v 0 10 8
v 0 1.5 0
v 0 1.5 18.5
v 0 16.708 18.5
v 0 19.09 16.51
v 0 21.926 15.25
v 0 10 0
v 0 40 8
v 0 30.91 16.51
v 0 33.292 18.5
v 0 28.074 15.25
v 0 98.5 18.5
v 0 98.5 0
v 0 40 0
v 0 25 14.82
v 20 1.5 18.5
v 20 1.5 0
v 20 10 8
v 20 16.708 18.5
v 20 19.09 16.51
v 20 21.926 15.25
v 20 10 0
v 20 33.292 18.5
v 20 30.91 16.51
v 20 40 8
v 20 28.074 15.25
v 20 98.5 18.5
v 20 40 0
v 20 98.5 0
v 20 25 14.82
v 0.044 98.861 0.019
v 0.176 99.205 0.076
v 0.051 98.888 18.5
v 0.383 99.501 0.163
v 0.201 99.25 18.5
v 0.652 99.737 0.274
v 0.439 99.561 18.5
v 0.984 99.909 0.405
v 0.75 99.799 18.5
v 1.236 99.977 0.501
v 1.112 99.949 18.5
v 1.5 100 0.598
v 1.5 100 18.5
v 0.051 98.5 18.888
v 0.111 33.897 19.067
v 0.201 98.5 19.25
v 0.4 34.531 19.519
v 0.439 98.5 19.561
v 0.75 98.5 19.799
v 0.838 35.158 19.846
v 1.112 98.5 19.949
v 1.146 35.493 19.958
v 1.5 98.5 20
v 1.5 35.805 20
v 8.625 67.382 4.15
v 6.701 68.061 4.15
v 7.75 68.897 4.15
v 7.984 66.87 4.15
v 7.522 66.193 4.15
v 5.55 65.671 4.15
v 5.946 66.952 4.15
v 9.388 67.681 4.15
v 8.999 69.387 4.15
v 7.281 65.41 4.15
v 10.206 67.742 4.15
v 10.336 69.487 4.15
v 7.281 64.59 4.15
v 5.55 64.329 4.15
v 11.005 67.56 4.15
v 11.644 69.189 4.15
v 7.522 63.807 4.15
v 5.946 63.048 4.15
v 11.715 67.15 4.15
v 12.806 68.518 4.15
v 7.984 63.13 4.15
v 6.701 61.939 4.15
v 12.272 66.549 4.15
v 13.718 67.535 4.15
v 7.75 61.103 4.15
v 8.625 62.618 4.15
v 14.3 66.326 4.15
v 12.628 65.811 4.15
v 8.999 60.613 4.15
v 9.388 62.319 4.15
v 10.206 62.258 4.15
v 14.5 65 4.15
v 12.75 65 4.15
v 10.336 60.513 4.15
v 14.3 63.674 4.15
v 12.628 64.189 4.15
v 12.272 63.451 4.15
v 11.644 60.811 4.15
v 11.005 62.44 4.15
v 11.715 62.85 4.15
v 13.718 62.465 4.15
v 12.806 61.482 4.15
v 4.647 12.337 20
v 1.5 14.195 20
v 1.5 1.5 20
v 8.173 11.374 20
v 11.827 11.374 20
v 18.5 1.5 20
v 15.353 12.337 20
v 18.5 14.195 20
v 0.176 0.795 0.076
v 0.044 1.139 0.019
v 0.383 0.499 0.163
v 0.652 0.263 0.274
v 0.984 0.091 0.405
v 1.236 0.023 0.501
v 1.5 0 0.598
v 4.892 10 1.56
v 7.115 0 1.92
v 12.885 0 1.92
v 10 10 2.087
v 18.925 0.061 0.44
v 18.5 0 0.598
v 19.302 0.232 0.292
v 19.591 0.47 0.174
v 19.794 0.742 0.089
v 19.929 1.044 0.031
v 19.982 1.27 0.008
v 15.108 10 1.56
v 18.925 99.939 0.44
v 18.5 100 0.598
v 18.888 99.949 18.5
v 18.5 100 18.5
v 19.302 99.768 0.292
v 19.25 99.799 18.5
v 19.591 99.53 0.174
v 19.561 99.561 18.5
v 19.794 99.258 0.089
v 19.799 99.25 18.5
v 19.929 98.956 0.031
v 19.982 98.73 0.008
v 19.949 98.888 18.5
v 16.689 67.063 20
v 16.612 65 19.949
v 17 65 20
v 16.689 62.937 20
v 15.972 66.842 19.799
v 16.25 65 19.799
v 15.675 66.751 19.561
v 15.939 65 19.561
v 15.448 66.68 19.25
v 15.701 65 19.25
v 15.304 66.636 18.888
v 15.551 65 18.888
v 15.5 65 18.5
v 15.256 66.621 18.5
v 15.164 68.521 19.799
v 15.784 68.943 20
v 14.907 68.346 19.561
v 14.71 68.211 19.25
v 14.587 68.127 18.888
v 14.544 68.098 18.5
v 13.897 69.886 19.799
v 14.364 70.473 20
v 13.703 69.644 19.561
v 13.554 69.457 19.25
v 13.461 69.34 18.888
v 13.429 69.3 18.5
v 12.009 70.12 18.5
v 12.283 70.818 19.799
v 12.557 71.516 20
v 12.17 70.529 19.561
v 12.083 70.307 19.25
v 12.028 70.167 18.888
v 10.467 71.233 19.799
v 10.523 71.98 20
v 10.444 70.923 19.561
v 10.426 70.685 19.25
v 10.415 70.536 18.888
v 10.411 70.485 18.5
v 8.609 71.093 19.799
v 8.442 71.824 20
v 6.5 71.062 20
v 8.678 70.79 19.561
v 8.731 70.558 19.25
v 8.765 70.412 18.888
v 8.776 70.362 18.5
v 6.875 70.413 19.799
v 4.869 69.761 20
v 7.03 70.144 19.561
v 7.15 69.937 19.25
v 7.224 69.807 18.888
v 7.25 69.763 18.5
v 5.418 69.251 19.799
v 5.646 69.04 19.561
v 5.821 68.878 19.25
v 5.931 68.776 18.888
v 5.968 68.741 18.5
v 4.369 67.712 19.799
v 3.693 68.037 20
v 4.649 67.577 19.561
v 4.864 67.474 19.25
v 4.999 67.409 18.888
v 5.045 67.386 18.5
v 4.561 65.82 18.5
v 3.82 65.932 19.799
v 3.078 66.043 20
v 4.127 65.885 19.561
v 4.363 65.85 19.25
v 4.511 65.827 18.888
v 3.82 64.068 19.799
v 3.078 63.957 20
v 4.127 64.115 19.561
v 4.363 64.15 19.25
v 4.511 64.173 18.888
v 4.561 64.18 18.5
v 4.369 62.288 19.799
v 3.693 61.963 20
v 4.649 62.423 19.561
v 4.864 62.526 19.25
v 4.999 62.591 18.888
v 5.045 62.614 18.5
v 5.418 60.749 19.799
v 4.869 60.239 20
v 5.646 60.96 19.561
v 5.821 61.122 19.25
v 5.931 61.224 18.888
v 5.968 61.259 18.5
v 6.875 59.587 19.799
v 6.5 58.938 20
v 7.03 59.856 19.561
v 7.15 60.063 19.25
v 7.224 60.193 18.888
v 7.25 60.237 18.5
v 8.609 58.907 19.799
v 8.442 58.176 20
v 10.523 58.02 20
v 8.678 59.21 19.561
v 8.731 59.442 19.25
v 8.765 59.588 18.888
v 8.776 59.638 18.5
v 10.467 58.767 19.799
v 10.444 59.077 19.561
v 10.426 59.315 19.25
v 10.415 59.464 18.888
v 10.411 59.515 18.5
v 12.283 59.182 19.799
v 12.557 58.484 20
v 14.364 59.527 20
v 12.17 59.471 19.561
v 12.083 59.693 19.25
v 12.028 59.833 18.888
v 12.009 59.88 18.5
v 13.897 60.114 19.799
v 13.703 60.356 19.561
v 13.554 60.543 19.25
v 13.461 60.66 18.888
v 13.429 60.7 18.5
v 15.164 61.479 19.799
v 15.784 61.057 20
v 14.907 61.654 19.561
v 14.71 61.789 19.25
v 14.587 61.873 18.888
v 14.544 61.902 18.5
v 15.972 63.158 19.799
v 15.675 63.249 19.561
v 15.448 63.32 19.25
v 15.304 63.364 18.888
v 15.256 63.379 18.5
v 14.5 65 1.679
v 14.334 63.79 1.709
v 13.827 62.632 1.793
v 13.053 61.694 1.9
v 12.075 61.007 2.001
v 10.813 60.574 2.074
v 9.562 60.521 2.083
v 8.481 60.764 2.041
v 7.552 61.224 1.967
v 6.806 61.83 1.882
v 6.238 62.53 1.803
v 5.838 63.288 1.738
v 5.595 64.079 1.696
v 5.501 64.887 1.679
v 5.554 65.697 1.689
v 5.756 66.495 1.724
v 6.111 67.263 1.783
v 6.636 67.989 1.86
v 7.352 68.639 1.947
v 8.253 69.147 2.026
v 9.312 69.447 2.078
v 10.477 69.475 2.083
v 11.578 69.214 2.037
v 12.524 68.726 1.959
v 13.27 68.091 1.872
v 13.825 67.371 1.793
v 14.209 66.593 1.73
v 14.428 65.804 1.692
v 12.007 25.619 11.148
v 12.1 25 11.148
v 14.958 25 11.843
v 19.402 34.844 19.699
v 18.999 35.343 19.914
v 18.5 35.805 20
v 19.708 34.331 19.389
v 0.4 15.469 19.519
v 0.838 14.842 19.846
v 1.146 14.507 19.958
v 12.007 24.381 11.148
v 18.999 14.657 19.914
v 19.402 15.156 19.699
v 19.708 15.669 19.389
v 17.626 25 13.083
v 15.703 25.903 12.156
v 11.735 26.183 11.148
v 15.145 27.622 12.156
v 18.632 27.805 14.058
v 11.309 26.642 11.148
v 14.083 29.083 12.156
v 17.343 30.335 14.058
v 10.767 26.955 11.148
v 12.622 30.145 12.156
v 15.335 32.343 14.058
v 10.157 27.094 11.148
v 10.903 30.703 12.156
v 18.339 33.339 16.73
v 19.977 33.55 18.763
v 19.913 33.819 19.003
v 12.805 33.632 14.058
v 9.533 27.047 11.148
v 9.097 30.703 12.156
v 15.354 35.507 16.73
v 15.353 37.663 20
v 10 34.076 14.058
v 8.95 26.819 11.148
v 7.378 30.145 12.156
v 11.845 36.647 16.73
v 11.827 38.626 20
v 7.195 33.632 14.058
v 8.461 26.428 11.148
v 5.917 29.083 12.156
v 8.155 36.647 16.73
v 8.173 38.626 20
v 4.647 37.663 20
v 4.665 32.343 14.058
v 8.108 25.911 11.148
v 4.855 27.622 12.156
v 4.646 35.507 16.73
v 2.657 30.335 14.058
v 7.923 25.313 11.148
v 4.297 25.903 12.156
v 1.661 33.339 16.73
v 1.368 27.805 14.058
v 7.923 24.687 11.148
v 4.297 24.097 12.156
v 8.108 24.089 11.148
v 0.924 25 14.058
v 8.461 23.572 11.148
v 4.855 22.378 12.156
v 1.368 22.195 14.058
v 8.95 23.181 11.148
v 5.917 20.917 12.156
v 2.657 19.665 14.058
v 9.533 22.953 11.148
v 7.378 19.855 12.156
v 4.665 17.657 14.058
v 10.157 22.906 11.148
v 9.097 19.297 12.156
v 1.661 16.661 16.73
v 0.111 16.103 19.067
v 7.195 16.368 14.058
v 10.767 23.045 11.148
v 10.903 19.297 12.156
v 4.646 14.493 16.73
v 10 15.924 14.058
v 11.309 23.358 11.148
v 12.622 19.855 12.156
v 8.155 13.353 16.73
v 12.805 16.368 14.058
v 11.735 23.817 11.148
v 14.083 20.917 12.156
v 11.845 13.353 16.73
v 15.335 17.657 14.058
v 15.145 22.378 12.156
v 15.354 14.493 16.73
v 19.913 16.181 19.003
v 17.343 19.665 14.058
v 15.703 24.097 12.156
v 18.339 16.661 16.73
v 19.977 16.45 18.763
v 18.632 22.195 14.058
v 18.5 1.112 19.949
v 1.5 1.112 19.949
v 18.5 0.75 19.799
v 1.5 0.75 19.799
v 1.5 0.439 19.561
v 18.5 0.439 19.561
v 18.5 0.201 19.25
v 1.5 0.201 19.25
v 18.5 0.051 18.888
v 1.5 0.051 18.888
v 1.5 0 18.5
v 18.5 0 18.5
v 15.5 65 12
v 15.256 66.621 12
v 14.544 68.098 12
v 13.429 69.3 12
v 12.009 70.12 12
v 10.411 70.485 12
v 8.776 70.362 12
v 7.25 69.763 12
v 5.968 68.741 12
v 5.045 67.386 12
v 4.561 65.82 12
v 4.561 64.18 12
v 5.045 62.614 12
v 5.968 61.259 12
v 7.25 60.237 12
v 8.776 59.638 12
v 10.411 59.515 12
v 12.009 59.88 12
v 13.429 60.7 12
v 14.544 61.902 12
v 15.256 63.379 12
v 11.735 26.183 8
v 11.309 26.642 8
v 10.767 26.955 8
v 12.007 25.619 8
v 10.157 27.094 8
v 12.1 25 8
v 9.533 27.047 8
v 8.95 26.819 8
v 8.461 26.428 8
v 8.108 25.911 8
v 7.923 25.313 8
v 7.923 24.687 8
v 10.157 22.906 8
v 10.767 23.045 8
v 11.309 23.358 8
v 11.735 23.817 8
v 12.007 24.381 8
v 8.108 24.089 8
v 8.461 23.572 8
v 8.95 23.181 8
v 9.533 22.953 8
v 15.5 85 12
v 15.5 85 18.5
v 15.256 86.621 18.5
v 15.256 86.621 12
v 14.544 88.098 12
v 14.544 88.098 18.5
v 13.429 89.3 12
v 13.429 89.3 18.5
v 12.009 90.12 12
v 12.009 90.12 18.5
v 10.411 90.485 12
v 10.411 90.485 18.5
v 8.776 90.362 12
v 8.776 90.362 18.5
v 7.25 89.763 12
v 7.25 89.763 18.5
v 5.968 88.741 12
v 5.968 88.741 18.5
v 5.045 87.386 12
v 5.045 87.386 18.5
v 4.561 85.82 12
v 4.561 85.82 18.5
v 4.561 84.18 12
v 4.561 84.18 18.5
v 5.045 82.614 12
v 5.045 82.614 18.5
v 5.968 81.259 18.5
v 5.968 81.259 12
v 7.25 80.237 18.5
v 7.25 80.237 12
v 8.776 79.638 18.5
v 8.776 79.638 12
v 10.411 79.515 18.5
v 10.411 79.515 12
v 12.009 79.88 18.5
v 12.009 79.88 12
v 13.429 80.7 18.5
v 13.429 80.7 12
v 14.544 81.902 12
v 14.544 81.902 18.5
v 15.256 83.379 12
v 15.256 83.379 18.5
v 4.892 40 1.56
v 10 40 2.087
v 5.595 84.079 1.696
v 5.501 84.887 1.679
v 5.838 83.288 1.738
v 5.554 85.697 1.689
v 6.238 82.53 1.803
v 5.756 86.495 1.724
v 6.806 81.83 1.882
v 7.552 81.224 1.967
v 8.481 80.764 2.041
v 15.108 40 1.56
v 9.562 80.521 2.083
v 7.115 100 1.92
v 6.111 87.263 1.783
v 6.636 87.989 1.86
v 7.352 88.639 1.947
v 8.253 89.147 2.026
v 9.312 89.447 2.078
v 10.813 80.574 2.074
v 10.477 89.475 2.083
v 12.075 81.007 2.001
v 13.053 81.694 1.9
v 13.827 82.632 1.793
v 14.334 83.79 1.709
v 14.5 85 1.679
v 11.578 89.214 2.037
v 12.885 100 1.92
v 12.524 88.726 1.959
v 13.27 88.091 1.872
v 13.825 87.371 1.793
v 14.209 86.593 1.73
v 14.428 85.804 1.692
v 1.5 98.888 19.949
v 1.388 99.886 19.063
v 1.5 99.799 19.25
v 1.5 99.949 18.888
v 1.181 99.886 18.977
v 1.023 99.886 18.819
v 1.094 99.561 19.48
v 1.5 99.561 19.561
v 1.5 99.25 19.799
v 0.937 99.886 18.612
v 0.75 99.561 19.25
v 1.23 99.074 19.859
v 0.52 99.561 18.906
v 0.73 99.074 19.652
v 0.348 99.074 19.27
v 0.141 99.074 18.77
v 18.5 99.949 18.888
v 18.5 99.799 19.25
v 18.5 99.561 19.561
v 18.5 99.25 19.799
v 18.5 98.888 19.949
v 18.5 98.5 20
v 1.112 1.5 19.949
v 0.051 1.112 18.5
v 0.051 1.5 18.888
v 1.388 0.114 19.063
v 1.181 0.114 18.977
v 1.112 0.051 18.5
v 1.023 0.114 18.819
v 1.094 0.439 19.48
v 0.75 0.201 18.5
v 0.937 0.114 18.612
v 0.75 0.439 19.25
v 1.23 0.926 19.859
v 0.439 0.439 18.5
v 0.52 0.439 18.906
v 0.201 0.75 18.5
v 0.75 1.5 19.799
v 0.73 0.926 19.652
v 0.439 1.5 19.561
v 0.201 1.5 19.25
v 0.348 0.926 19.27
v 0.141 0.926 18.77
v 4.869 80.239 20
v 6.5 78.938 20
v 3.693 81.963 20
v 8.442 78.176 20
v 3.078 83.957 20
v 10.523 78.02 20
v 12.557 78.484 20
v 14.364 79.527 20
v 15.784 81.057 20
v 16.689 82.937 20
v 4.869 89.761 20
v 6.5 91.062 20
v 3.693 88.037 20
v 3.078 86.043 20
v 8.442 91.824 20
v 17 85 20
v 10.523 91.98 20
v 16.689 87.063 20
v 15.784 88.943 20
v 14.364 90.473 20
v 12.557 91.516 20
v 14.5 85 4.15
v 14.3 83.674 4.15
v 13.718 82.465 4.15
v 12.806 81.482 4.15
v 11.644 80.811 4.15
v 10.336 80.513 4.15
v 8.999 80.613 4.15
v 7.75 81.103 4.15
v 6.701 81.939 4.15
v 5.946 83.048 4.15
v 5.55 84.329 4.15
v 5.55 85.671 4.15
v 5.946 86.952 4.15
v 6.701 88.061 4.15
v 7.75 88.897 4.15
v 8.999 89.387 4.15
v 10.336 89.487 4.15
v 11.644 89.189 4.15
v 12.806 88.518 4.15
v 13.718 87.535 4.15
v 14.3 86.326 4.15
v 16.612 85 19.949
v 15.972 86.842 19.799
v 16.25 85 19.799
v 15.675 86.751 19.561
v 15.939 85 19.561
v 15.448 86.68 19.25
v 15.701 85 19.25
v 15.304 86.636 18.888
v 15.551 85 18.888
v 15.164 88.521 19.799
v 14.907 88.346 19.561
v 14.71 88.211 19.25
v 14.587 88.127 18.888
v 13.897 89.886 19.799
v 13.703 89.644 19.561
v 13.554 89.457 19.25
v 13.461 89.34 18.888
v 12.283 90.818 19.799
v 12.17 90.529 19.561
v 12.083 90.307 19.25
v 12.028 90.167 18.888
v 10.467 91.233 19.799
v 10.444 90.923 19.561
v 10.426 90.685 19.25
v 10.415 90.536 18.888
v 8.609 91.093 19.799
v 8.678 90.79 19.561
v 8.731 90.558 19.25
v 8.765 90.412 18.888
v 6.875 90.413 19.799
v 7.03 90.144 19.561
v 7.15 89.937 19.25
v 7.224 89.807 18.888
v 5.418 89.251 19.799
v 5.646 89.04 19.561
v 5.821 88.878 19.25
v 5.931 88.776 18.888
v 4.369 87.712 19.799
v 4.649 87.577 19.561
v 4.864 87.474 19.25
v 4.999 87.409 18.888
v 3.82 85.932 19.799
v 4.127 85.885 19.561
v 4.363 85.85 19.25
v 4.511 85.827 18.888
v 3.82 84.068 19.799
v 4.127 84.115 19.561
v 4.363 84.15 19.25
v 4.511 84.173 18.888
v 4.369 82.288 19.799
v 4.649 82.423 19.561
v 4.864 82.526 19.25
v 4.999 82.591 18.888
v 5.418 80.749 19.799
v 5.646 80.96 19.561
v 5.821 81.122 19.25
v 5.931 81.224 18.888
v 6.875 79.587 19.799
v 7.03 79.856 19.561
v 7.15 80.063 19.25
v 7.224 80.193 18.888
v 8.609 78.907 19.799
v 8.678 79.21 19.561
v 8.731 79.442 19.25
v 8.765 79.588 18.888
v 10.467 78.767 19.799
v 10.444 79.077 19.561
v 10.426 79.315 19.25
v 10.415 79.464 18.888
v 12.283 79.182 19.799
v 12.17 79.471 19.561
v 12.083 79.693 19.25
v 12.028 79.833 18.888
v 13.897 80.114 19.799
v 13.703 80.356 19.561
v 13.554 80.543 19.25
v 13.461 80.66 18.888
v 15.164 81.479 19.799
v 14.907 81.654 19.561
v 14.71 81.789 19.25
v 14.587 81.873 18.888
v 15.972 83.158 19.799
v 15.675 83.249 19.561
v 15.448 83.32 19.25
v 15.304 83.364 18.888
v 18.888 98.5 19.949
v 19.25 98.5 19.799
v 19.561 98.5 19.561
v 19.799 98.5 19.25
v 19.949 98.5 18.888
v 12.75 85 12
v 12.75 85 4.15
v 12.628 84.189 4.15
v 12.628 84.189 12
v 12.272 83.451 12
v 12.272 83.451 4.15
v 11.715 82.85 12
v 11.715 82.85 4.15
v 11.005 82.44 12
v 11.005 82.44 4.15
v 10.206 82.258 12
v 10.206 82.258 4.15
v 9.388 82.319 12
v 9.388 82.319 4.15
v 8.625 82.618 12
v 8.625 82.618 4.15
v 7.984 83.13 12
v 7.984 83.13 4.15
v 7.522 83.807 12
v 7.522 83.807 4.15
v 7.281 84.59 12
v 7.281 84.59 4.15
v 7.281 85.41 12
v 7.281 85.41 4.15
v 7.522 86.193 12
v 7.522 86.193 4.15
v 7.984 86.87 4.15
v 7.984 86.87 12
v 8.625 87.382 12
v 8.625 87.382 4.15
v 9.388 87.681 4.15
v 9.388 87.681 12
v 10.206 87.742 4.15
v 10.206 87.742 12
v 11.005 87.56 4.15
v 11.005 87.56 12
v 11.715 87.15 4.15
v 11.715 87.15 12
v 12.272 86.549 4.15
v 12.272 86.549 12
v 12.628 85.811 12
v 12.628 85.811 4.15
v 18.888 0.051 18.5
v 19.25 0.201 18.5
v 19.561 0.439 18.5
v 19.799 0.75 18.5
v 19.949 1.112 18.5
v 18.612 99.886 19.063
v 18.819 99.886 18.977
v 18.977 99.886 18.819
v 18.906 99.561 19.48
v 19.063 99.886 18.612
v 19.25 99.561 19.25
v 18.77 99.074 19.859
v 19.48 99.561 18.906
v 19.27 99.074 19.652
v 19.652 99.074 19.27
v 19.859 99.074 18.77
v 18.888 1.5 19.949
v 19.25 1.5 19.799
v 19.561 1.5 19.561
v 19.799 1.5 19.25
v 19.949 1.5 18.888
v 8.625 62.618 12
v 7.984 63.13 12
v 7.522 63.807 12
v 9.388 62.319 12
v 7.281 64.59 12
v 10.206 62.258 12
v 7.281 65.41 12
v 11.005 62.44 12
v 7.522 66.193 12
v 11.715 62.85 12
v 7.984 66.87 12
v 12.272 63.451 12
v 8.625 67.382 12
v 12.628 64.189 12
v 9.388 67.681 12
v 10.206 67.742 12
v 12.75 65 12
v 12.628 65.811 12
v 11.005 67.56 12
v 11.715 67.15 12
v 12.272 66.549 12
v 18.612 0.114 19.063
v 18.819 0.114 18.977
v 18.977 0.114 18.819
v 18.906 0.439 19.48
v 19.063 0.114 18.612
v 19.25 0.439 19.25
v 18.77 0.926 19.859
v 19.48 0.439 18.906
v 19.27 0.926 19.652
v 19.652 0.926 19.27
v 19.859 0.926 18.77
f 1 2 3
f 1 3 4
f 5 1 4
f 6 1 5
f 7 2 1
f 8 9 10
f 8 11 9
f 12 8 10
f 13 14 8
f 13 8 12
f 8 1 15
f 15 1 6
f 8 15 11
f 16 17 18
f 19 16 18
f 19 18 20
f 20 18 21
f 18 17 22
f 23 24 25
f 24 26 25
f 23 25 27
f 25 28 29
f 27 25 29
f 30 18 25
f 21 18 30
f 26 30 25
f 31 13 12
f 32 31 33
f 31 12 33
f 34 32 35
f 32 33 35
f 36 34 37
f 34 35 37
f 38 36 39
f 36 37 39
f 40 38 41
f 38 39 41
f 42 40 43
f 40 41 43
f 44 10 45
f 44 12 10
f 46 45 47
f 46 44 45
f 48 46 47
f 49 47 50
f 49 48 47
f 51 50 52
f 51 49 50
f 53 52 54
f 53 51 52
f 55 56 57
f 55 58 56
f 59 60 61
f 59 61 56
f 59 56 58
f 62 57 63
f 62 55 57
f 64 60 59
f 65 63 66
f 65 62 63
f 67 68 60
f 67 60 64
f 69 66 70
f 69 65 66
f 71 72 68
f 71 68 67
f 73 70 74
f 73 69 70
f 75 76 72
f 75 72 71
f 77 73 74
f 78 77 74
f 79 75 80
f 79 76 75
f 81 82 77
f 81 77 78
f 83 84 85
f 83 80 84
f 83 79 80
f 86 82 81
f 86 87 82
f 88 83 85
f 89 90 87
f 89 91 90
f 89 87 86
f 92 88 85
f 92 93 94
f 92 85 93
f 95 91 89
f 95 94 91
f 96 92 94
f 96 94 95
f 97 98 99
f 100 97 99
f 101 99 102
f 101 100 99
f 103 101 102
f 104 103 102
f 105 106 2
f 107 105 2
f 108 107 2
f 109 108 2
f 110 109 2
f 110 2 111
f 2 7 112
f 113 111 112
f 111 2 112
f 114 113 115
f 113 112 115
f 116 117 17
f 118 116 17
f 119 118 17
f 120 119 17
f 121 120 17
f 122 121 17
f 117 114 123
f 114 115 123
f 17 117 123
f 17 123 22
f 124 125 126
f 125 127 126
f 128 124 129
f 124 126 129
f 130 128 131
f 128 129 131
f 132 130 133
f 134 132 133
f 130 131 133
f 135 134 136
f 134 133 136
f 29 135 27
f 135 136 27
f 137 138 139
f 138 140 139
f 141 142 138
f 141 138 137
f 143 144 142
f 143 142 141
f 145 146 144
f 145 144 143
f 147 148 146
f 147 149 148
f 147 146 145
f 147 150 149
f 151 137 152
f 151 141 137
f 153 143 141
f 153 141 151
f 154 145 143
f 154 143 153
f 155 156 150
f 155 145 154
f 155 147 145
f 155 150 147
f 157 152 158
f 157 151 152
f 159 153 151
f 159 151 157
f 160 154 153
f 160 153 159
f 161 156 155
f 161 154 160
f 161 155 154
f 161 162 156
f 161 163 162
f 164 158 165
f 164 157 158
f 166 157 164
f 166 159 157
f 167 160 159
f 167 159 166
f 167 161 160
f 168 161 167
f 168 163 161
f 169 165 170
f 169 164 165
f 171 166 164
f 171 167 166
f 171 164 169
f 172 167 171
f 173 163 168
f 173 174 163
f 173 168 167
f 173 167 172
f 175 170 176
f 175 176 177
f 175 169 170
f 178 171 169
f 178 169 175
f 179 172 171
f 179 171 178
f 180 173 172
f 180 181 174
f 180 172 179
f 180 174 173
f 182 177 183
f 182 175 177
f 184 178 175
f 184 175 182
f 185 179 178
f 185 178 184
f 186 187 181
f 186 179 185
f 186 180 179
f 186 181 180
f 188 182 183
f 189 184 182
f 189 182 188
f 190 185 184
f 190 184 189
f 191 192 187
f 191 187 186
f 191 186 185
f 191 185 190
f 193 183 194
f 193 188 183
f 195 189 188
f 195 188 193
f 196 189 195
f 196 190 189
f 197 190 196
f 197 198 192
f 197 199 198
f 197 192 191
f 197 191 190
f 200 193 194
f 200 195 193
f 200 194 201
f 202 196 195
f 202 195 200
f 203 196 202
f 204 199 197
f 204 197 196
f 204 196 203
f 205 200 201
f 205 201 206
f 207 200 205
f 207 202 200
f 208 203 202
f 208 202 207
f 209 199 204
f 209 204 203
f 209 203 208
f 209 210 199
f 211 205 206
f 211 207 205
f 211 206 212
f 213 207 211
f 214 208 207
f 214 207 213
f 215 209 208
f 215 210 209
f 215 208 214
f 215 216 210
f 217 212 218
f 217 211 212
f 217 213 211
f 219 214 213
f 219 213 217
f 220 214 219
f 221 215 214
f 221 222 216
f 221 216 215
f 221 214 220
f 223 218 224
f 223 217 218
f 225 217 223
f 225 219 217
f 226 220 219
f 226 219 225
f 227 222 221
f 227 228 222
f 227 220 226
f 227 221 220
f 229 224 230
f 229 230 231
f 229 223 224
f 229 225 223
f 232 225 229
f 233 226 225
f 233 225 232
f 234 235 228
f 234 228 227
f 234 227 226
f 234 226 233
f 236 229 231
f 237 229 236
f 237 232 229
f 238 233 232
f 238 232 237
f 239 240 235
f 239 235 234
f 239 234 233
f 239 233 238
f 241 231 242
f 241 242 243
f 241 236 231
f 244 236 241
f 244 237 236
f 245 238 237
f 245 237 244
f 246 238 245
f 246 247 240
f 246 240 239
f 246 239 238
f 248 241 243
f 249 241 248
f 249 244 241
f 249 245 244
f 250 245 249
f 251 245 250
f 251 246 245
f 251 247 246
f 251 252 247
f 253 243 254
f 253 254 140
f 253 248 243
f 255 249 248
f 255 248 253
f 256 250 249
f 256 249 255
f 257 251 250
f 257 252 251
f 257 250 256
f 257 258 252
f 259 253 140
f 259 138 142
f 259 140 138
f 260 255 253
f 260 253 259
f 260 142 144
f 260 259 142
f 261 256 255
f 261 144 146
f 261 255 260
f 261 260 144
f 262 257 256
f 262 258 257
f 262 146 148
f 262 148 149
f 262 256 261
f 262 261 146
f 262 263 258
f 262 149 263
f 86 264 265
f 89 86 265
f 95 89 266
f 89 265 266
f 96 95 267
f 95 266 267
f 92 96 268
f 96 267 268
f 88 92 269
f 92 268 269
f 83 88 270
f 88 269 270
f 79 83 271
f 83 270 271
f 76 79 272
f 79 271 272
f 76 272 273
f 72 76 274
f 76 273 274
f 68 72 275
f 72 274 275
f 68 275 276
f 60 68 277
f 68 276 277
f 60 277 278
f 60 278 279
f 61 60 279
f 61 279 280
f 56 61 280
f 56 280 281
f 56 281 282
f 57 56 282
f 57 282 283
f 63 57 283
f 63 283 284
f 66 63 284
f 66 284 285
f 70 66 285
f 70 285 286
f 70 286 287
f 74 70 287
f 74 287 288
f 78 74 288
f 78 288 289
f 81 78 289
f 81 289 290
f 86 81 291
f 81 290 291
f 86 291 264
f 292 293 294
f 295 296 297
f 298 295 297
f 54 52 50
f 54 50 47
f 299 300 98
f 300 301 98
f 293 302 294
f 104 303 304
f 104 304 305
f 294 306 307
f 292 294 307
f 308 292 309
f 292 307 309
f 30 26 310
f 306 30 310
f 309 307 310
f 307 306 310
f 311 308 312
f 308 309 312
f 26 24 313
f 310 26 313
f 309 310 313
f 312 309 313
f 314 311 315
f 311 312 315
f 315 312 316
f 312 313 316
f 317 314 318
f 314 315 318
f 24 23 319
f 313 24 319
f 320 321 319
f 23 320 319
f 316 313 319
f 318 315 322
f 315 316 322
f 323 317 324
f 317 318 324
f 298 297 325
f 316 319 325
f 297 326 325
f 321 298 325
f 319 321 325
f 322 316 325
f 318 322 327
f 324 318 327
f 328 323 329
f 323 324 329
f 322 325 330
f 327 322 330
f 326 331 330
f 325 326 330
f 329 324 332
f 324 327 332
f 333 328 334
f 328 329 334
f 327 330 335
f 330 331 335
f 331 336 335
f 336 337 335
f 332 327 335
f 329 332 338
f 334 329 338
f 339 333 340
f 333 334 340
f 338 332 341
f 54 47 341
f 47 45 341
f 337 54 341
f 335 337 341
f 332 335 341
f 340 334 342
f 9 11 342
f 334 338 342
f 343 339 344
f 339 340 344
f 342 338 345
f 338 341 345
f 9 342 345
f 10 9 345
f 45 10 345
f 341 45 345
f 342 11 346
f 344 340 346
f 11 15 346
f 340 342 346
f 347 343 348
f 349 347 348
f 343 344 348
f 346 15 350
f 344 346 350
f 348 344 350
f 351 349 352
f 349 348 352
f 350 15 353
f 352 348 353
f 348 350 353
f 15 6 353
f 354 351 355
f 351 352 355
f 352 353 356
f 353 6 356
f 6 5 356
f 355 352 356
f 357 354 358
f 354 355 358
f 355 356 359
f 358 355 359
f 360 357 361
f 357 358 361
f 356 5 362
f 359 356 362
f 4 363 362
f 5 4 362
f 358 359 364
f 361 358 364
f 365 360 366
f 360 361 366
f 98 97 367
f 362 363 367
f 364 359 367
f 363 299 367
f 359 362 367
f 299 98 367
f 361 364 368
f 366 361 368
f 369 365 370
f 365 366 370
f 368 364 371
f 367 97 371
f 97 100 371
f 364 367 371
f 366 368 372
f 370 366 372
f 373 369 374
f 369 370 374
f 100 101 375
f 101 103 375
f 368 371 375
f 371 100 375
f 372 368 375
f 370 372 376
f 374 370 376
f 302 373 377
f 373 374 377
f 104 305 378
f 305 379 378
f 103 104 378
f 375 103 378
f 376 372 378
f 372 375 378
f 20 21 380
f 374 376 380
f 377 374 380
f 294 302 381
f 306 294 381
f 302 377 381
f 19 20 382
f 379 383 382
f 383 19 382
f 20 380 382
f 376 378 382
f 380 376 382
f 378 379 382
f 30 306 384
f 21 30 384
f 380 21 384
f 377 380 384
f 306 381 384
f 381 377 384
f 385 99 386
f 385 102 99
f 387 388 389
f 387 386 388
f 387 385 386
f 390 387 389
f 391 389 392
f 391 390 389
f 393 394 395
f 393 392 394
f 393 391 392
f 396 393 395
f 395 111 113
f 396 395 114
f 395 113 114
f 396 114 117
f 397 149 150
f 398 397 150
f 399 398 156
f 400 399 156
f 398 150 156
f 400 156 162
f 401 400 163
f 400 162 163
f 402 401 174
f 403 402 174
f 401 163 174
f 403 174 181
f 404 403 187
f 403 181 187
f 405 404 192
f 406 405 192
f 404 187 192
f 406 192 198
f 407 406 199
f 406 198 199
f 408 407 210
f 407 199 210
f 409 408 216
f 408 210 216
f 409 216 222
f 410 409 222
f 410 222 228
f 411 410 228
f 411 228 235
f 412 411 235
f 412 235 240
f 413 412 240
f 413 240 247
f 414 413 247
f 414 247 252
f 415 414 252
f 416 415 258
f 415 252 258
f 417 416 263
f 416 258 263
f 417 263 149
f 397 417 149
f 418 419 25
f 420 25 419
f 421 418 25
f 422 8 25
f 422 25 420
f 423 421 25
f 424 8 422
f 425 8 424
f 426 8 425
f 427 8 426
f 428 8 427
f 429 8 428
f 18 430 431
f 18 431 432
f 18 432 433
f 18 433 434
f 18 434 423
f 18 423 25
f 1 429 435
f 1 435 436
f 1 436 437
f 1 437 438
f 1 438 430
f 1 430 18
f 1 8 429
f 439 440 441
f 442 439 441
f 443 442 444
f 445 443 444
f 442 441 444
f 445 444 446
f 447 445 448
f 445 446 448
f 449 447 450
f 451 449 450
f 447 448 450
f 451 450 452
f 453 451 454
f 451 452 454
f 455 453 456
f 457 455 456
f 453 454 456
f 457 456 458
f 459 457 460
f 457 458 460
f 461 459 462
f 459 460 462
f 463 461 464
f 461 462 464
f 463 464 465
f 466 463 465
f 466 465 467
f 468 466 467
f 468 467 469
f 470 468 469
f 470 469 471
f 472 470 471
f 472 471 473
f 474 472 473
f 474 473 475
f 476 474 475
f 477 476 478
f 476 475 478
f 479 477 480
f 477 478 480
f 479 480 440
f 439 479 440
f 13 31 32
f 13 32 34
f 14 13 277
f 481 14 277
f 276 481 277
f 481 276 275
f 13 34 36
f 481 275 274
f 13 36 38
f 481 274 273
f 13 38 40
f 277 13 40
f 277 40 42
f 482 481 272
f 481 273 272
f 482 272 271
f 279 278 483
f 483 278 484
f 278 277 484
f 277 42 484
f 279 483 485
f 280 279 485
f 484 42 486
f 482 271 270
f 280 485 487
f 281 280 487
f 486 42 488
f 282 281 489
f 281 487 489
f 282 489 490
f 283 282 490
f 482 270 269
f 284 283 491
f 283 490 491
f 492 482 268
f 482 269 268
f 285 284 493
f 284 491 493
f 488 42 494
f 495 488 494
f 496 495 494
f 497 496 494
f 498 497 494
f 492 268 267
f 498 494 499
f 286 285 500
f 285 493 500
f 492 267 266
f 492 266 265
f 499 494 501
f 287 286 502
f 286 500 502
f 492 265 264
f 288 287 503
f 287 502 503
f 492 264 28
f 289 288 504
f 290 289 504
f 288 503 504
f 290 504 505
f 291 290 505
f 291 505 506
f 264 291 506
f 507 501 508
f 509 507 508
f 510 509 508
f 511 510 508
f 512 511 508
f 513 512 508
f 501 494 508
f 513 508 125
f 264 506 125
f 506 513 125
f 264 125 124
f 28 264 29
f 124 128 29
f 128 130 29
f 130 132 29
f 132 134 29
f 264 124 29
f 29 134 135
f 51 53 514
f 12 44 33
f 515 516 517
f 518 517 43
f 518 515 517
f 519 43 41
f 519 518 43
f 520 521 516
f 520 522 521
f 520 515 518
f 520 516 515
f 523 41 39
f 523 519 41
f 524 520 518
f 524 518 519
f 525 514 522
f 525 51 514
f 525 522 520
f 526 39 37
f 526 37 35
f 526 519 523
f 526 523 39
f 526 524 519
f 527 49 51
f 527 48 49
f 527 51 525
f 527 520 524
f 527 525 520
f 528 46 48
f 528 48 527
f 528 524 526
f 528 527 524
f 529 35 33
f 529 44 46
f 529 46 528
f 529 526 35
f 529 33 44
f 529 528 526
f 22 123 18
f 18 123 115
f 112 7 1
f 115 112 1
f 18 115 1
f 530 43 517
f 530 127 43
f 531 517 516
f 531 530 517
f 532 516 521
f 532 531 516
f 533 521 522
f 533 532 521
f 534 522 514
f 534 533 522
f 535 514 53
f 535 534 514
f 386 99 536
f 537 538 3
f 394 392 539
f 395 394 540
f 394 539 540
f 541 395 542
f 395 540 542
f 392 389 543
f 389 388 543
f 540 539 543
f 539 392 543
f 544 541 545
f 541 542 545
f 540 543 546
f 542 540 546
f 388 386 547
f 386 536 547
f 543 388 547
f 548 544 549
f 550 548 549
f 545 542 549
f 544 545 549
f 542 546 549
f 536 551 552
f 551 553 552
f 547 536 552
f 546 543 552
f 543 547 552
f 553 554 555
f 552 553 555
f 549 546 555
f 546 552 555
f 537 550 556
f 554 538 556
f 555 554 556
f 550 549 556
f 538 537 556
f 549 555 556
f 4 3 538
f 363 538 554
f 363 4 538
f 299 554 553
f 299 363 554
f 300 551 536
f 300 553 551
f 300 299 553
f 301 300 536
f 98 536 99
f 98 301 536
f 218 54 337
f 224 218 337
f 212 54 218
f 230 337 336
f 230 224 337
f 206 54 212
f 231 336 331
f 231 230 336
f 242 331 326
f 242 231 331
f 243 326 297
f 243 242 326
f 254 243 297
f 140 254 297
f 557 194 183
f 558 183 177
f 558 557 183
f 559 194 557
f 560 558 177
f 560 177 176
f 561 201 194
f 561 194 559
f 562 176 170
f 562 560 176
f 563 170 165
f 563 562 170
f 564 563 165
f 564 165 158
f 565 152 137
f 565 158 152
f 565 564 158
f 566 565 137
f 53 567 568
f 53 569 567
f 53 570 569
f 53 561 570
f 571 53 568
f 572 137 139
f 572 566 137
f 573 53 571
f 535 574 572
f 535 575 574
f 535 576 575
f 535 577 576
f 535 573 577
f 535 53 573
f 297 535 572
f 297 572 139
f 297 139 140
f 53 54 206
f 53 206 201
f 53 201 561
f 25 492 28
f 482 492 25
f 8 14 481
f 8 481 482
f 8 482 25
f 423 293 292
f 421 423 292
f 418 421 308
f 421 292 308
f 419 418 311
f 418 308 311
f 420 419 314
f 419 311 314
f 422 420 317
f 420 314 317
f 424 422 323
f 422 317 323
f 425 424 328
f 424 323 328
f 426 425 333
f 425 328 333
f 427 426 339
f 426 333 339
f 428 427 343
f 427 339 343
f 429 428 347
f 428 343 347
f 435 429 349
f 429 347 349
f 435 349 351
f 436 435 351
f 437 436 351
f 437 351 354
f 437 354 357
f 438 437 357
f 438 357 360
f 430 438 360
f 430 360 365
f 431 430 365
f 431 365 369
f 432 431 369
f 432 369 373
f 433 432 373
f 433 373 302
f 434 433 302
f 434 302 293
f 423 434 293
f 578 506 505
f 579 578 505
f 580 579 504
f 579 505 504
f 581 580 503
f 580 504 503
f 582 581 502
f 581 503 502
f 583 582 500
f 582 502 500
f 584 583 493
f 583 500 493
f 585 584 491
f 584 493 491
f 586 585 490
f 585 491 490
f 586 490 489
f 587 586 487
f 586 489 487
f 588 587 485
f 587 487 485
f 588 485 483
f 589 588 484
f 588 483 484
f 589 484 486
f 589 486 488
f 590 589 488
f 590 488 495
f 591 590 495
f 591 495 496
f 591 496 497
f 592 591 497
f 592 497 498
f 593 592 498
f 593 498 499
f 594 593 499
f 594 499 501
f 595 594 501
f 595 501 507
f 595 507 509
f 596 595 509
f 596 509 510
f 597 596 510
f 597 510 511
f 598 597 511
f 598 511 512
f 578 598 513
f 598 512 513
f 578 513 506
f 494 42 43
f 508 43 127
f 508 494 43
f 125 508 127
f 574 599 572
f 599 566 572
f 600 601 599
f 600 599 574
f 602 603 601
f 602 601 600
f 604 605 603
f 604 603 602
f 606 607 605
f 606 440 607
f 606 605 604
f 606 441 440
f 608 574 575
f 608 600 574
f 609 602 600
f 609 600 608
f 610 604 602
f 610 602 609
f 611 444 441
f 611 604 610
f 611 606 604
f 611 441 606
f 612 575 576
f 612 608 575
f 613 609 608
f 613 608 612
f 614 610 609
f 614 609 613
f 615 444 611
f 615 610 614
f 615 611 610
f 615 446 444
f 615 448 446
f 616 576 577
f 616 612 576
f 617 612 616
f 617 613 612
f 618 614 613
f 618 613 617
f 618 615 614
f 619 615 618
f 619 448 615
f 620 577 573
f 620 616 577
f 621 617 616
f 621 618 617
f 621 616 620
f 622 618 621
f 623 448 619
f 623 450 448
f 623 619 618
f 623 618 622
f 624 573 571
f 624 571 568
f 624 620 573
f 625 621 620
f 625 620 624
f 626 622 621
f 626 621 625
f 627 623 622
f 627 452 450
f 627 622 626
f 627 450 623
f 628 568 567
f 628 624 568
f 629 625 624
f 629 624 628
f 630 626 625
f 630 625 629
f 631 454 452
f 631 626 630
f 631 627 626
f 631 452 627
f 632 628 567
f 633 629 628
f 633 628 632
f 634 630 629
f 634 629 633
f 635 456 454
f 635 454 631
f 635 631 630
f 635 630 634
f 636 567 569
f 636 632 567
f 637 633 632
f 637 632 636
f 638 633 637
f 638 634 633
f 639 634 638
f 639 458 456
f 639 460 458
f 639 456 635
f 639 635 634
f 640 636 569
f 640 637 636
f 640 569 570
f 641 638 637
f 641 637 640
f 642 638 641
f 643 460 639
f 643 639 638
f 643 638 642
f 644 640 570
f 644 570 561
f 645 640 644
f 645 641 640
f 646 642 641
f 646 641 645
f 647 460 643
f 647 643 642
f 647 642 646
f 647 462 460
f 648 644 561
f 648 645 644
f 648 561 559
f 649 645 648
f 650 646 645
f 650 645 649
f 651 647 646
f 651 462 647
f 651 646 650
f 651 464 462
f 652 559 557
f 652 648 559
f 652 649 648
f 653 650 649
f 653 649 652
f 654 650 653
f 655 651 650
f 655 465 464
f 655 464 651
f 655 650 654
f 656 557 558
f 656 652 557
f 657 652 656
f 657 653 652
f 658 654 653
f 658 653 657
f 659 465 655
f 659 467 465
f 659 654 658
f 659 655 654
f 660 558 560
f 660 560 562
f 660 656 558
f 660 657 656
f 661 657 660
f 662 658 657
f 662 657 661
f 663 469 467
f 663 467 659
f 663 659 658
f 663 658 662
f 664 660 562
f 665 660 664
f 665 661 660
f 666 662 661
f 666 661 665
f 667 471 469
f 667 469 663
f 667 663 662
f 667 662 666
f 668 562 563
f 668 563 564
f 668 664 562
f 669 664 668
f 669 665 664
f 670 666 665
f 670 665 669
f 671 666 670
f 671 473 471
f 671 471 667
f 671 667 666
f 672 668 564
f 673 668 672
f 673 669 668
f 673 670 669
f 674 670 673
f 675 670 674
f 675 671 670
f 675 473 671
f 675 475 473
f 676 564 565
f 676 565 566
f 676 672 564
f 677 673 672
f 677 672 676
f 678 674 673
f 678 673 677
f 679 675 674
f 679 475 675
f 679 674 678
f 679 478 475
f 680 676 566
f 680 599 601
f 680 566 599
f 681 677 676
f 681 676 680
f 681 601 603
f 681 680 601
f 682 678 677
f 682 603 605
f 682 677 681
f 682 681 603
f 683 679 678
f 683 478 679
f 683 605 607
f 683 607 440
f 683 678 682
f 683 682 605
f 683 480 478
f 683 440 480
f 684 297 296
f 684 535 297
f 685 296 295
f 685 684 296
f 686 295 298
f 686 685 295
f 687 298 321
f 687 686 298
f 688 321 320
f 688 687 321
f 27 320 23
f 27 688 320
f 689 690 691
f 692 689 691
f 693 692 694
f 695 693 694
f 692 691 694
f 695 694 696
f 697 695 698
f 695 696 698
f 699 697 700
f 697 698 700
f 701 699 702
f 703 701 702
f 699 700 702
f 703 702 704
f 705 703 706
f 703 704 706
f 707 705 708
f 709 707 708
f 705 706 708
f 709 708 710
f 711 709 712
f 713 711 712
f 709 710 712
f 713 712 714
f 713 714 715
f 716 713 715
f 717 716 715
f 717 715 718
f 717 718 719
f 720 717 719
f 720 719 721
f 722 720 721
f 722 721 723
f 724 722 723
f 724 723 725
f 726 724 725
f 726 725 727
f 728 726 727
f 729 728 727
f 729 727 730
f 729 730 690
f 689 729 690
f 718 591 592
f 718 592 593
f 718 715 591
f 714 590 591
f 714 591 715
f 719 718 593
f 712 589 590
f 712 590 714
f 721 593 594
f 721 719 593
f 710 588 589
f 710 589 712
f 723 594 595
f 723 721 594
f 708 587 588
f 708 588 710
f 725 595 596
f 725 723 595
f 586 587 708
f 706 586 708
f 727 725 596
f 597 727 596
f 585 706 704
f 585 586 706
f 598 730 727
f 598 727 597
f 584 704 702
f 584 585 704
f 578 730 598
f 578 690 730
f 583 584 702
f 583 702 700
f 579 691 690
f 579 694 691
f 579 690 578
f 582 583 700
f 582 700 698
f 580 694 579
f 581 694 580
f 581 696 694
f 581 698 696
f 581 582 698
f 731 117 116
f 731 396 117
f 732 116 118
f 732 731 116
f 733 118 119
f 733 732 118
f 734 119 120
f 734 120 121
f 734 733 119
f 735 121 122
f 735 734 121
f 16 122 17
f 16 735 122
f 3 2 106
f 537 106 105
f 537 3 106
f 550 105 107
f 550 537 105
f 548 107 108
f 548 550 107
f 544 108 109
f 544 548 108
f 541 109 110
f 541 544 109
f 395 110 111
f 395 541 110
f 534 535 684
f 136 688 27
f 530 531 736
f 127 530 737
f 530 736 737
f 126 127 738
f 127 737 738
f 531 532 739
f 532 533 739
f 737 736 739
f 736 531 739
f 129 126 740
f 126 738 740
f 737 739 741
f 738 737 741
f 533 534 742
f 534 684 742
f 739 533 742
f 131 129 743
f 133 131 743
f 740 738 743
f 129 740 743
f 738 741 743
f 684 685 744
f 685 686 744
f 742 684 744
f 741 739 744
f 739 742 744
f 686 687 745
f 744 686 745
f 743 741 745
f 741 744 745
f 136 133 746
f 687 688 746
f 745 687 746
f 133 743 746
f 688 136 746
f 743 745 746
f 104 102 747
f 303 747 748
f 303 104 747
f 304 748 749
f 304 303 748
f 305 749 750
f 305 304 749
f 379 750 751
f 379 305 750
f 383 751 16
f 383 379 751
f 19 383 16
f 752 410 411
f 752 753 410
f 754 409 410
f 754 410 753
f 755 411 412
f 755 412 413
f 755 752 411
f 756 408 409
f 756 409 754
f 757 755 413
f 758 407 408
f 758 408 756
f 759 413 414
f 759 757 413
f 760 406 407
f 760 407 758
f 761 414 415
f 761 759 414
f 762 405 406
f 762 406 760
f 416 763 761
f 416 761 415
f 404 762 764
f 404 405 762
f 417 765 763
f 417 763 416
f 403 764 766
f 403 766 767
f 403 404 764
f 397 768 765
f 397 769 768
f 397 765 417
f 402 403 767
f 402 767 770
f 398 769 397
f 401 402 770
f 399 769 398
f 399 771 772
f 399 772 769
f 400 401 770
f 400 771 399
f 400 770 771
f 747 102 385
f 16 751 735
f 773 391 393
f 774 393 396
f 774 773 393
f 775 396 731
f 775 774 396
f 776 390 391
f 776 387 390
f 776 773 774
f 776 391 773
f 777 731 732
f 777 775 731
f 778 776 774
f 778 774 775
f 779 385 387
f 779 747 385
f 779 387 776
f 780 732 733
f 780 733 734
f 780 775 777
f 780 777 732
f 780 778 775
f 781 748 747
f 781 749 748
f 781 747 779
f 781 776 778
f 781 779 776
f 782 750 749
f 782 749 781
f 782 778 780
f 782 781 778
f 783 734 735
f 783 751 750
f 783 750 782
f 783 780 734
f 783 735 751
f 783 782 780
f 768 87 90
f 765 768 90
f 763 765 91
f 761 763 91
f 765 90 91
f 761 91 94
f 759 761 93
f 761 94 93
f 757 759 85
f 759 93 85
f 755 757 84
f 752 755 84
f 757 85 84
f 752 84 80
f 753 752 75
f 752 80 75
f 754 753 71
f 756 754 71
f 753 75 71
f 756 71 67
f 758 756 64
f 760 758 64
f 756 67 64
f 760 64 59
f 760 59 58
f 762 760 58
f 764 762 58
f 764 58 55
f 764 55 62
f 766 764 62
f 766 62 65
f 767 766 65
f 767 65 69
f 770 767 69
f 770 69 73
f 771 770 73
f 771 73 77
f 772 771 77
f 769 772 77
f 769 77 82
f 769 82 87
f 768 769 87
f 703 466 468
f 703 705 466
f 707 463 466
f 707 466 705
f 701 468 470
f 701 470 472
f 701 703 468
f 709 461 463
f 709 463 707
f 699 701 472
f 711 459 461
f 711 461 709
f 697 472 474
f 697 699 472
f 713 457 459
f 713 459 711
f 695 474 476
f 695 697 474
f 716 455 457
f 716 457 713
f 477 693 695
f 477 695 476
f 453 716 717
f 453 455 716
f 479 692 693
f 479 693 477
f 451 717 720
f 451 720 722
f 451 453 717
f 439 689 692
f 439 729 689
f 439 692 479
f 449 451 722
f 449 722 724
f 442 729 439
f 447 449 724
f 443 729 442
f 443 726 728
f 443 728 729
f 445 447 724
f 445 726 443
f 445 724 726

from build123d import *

# Parameters (mm, degrees)
BOX_W           = 20
BOX_H           = 100
BOX_DEPTH       = 20
SKETCH007_R     = 2.75
POCKET003_DEPTH = 20
SKETCH009_R     = 4.5
POCKET004_DEPTH = 4.15
SKETCH008_R     = 25
POCKET005_DEPTH = 100.001
SKETCH_W        = 30
SKETCH_H        = 20
POCKET_DEPTH    = 20.001
SKETCH010_R     = 2.1
POCKET006_DEPTH = 20.001
SKETCH011_R     = 5.5
POCKET007_DEPTH = 8
FILLET_R        = 1.5


with BuildPart() as part:
    # Box → Box (new body)
    with BuildSketch(Plane(origin=(-10, 0, -8), x_dir=(1, 0, 0), z_dir=(0, 0, 1))):
        with Locations((10, 50)):
            Rectangle(BOX_W, BOX_H)
    extrude(amount=BOX_DEPTH)

    # Sketch007 (on Face5 of Box) → Pocket003 (cut)
    with BuildSketch(Plane(origin=(-10, 0, -8), x_dir=(1, 0, 0), z_dir=(0, 0, -1))):
        with Locations((10, -65)):
            Circle(SKETCH007_R)
        with Locations((10, -85)):
            Circle(SKETCH007_R)
    extrude(amount=-POCKET003_DEPTH, mode=Mode.SUBTRACT)

    # Sketch009 (on Face5 of Pocket003) → Pocket004 (cut)
    with BuildSketch(Plane(origin=(-10, 0, -8), x_dir=(1, 0, 0), z_dir=(0, 0, -1))):
        with Locations((10, -85)):
            Circle(SKETCH009_R)
        with Locations((10, -65)):
            Circle(SKETCH009_R)
    extrude(amount=-POCKET004_DEPTH, mode=Mode.SUBTRACT)

    # Sketch008 (on Face4 of Pocket004) → Pocket005 (cut, through all)
    with BuildSketch(Plane(origin=(-10, 100, -8), x_dir=(-1, 0, 0), z_dir=(0, 1, 0))):
        with Locations((-10, -22.912878)):
            Circle(SKETCH008_R)
    extrude(amount=-POCKET005_DEPTH, mode=Mode.SUBTRACT)


with BuildPart() as part_1:
    # BaseFeature placement: moved
    add(part.part.moved(Location((10, 0, 8))))

    # Sketch (on Face1 of BaseFeature) → Pocket (cut, through all)
    with BuildSketch(Plane(origin=(0, 0, 0), x_dir=(0, -1, 0), z_dir=(-1, 0, 0))):
        with Locations((-25, -2)):
            Rectangle(SKETCH_W, SKETCH_H)
    extrude(amount=-POCKET_DEPTH, mode=Mode.SUBTRACT)

    # Sketch010 (on Face2 of Pocket) → Pocket006 (cut, through all)
    with BuildSketch(Plane.XY.offset(20)):
        with Locations((10, 25)):
            Circle(SKETCH010_R)
    extrude(amount=-POCKET006_DEPTH, mode=Mode.SUBTRACT)

    # Sketch011 (on Face2 of Pocket006) → Pocket007 (cut)
    with BuildSketch(Plane.XY.offset(20)):
        with Locations((10, 85)):
            Circle(SKETCH011_R)
        with Locations((10, 65)):
            Circle(SKETCH011_R)
    extrude(amount=-POCKET007_DEPTH, mode=Mode.SUBTRACT)

    # Sphere → Sphere (revolve, cut)
    with BuildSketch(Plane(origin=(10, 25, 26), x_dir=(1, 0, 0), z_dir=(0, -1, 0))):
        with BuildLine():
            ThreePointArc((0, -15), (15, 0), (0, 15))
            Line((0, 15), (0, -15))
        make_face()
    revolve(axis=Axis((10, 25, 26), (0, 0, 1)), mode=Mode.SUBTRACT)

    # Fillet
    fillet_edges = [part_1.edges().sort_by_distance(p)[0] for p in [
        (20, 67.216991, 20),
        (0, 67.216991, 20),
        (10, 100, 20),
        (0, 7.783009, 20),
        (20, 7.783009, 20),
        (10, 0, 20),
        (0, 0, 10),
        (0, 100, 10),
        (20, 100, 10),
        (20, 0, 10),
        (4.5, 65, 20),
        (4.5, 85, 20),
    ]]
    fillet(fillet_edges, radius=FILLET_R)


solid = part_1.part
